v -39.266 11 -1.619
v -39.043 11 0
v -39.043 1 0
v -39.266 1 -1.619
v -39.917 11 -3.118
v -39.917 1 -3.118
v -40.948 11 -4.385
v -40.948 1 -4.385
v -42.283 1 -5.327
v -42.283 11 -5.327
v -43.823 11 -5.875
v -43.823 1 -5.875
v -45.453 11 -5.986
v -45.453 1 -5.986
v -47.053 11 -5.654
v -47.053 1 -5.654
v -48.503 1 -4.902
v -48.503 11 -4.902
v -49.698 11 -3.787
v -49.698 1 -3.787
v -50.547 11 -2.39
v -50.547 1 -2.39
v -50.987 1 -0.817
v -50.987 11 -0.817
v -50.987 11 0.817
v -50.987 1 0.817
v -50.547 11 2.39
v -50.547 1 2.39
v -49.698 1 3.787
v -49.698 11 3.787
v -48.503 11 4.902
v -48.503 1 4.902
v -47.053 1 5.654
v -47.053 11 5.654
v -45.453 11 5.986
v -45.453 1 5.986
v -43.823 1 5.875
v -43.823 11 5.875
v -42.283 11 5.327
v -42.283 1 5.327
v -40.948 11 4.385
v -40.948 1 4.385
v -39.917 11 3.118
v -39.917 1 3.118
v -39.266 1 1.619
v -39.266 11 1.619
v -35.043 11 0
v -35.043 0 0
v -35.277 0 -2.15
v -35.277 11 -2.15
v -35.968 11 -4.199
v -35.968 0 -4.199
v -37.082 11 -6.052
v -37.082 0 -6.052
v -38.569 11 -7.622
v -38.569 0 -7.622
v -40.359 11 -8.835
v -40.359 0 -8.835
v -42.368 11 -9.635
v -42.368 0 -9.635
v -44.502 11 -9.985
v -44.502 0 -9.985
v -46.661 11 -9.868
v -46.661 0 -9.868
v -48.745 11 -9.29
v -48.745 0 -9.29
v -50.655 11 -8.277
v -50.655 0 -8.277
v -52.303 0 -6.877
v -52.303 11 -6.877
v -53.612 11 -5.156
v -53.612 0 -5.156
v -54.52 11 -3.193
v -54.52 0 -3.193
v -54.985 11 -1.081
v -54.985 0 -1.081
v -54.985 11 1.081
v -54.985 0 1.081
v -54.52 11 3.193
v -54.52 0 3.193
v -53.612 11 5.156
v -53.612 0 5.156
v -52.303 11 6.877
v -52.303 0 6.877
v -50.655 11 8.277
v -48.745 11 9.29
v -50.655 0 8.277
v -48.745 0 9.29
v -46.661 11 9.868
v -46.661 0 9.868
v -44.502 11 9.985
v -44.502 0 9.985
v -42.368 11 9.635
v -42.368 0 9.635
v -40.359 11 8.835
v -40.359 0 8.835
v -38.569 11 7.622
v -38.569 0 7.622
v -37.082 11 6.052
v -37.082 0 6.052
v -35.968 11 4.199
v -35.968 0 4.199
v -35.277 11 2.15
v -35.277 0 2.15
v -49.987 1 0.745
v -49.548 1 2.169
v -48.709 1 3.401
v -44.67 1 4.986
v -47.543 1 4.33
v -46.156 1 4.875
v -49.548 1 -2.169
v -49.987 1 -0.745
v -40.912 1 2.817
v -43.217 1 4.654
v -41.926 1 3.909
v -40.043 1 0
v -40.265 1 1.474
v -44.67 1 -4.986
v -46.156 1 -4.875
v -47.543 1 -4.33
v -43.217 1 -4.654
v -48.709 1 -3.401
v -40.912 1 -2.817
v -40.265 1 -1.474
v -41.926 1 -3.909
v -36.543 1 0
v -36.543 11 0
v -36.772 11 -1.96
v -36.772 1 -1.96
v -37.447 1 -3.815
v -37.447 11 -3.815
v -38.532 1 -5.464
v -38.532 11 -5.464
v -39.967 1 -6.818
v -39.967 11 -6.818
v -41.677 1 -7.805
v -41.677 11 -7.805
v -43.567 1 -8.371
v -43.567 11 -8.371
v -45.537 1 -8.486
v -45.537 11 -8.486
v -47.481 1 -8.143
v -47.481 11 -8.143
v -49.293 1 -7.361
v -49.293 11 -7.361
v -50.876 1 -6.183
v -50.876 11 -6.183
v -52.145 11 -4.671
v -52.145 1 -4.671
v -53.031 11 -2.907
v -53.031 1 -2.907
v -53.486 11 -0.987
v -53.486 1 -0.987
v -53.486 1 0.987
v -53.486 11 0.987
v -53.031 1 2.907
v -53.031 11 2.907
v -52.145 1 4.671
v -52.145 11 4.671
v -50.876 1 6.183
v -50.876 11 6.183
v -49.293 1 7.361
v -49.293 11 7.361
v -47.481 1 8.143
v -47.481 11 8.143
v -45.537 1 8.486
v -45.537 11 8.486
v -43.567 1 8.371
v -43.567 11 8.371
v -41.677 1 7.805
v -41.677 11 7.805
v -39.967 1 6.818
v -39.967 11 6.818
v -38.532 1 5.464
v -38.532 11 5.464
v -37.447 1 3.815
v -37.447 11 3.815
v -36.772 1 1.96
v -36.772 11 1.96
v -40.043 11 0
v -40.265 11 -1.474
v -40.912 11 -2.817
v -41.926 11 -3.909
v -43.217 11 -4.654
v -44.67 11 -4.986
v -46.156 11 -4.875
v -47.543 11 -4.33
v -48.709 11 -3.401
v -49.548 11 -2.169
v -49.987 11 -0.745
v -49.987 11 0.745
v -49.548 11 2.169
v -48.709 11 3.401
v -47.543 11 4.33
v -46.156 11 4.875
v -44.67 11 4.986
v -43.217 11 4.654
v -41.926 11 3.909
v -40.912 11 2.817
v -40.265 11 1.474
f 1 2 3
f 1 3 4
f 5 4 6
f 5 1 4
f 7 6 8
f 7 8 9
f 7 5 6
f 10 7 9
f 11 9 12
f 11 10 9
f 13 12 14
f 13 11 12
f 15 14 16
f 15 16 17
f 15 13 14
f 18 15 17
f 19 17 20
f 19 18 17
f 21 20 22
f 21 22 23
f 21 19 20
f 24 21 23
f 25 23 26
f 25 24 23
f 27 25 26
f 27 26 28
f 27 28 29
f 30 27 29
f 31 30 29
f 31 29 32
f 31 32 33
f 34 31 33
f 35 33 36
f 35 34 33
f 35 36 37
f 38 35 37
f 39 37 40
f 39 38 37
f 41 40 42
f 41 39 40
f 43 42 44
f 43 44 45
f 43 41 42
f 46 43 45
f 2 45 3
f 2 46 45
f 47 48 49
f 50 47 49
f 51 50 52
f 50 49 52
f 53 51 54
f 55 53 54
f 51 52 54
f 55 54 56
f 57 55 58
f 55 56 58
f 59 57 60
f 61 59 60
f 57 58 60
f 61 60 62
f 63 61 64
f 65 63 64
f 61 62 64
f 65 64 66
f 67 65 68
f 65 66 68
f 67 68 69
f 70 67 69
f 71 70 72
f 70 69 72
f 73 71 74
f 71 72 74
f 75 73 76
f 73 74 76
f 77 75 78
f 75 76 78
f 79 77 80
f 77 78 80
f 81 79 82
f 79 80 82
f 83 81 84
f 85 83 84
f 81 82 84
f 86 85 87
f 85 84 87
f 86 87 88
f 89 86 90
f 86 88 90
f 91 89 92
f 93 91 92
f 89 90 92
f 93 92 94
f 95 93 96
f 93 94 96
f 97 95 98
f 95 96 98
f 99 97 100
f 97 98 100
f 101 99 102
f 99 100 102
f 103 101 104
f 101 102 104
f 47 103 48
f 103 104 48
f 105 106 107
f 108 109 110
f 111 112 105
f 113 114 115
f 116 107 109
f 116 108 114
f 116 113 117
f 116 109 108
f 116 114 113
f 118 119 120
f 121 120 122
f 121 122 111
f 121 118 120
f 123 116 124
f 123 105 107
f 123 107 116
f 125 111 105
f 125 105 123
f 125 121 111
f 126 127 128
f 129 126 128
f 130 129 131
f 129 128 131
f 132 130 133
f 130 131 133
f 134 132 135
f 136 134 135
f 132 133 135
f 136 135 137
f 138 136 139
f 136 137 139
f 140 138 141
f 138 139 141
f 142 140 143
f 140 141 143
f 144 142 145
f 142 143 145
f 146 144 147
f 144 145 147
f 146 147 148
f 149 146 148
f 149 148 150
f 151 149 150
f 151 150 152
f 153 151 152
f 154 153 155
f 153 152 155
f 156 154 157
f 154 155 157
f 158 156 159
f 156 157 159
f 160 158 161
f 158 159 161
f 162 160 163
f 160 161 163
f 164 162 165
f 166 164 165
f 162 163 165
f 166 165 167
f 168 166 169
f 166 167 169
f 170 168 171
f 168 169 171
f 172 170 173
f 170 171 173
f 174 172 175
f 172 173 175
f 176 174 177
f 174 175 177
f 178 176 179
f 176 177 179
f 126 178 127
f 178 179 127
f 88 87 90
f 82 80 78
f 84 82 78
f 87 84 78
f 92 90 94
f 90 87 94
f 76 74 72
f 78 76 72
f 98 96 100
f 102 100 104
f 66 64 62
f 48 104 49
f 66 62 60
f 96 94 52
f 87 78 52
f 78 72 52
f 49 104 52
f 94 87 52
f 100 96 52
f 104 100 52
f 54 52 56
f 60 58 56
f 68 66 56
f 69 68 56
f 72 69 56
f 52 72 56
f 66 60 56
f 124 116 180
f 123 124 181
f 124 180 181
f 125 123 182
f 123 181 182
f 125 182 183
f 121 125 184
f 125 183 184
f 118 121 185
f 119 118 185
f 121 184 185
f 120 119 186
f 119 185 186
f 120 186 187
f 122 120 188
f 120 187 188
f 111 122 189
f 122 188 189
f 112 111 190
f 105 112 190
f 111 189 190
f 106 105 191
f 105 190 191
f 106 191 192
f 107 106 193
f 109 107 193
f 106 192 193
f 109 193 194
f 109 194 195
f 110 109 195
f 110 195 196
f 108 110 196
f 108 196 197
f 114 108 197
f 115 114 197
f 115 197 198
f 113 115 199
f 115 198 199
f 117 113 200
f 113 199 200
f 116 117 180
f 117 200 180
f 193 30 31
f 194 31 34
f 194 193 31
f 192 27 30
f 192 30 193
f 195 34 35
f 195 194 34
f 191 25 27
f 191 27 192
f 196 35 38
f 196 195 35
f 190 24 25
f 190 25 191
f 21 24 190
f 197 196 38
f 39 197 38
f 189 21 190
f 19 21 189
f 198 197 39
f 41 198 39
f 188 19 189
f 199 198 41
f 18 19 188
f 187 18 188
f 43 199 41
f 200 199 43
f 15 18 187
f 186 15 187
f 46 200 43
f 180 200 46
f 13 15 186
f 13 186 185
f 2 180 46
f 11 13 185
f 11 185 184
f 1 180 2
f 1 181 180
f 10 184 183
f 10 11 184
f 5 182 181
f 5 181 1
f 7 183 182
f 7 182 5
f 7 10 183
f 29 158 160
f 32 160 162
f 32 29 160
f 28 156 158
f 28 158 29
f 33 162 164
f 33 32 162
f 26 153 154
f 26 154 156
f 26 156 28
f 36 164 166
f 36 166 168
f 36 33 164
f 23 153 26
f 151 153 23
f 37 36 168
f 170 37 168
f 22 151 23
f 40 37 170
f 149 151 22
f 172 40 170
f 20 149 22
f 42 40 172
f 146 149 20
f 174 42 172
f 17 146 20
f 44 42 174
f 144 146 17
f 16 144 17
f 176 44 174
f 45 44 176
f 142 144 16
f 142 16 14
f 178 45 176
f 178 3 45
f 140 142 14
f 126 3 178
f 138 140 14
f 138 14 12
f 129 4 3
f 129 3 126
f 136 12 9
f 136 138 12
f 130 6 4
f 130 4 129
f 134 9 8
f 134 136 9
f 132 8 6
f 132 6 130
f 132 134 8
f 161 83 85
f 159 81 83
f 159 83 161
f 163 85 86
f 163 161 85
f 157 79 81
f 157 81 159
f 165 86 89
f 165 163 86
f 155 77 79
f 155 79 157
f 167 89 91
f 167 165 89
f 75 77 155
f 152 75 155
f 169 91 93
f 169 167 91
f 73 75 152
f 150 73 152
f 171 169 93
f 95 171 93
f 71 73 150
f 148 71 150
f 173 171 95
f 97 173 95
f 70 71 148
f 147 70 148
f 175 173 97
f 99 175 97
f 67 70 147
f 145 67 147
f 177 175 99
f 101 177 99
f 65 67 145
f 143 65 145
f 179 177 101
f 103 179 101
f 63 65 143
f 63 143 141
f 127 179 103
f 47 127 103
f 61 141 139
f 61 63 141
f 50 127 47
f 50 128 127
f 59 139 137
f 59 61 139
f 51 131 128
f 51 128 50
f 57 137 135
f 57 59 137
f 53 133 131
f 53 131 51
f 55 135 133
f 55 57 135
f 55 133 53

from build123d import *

# Parameters (mm, degrees)
SKETCH1_R           = 10
BOSS_EXTRUDE1_DEPTH = 11
SKETCH2_R           = 8.5
SKETCH2_R_2         = 6
CUT_EXTRUDE1_DEPTH  = 10
SKETCH3_R           = 5
CUT_EXTRUDE2_DEPTH  = 10


with BuildPart() as part:
    # Sketch1 → Boss-Extrude1 (new body)
    with BuildSketch(Plane(origin=(0, 0, 0), x_dir=(1, 0, 0), z_dir=(0, 1, 0))):
        with Locations((-45.043259766, 0)):
            Circle(SKETCH1_R)
    extrude(amount=BOSS_EXTRUDE1_DEPTH)

    # Sketch2 → Cut-Extrude1 (cut)
    with BuildSketch(Plane(origin=(0, 11, 0), x_dir=(1, 0, 0), z_dir=(0, 1, 0))):
        with Locations((-45.043259766, 0)):
            Circle(SKETCH2_R)
        with Locations((-45.043259766, 0)):
            Circle(SKETCH2_R_2, mode=Mode.SUBTRACT)
    extrude(amount=-CUT_EXTRUDE1_DEPTH, mode=Mode.SUBTRACT)

    # Sketch3 → Cut-Extrude2 (cut)
    with BuildSketch(Plane(origin=(0, 11, 0), x_dir=(1, 0, 0), z_dir=(0, 1, 0))):
        with Locations((-45.043259766, 0)):
            Circle(SKETCH3_R)
    extrude(amount=-CUT_EXTRUDE2_DEPTH, mode=Mode.SUBTRACT)


solid = part.part
